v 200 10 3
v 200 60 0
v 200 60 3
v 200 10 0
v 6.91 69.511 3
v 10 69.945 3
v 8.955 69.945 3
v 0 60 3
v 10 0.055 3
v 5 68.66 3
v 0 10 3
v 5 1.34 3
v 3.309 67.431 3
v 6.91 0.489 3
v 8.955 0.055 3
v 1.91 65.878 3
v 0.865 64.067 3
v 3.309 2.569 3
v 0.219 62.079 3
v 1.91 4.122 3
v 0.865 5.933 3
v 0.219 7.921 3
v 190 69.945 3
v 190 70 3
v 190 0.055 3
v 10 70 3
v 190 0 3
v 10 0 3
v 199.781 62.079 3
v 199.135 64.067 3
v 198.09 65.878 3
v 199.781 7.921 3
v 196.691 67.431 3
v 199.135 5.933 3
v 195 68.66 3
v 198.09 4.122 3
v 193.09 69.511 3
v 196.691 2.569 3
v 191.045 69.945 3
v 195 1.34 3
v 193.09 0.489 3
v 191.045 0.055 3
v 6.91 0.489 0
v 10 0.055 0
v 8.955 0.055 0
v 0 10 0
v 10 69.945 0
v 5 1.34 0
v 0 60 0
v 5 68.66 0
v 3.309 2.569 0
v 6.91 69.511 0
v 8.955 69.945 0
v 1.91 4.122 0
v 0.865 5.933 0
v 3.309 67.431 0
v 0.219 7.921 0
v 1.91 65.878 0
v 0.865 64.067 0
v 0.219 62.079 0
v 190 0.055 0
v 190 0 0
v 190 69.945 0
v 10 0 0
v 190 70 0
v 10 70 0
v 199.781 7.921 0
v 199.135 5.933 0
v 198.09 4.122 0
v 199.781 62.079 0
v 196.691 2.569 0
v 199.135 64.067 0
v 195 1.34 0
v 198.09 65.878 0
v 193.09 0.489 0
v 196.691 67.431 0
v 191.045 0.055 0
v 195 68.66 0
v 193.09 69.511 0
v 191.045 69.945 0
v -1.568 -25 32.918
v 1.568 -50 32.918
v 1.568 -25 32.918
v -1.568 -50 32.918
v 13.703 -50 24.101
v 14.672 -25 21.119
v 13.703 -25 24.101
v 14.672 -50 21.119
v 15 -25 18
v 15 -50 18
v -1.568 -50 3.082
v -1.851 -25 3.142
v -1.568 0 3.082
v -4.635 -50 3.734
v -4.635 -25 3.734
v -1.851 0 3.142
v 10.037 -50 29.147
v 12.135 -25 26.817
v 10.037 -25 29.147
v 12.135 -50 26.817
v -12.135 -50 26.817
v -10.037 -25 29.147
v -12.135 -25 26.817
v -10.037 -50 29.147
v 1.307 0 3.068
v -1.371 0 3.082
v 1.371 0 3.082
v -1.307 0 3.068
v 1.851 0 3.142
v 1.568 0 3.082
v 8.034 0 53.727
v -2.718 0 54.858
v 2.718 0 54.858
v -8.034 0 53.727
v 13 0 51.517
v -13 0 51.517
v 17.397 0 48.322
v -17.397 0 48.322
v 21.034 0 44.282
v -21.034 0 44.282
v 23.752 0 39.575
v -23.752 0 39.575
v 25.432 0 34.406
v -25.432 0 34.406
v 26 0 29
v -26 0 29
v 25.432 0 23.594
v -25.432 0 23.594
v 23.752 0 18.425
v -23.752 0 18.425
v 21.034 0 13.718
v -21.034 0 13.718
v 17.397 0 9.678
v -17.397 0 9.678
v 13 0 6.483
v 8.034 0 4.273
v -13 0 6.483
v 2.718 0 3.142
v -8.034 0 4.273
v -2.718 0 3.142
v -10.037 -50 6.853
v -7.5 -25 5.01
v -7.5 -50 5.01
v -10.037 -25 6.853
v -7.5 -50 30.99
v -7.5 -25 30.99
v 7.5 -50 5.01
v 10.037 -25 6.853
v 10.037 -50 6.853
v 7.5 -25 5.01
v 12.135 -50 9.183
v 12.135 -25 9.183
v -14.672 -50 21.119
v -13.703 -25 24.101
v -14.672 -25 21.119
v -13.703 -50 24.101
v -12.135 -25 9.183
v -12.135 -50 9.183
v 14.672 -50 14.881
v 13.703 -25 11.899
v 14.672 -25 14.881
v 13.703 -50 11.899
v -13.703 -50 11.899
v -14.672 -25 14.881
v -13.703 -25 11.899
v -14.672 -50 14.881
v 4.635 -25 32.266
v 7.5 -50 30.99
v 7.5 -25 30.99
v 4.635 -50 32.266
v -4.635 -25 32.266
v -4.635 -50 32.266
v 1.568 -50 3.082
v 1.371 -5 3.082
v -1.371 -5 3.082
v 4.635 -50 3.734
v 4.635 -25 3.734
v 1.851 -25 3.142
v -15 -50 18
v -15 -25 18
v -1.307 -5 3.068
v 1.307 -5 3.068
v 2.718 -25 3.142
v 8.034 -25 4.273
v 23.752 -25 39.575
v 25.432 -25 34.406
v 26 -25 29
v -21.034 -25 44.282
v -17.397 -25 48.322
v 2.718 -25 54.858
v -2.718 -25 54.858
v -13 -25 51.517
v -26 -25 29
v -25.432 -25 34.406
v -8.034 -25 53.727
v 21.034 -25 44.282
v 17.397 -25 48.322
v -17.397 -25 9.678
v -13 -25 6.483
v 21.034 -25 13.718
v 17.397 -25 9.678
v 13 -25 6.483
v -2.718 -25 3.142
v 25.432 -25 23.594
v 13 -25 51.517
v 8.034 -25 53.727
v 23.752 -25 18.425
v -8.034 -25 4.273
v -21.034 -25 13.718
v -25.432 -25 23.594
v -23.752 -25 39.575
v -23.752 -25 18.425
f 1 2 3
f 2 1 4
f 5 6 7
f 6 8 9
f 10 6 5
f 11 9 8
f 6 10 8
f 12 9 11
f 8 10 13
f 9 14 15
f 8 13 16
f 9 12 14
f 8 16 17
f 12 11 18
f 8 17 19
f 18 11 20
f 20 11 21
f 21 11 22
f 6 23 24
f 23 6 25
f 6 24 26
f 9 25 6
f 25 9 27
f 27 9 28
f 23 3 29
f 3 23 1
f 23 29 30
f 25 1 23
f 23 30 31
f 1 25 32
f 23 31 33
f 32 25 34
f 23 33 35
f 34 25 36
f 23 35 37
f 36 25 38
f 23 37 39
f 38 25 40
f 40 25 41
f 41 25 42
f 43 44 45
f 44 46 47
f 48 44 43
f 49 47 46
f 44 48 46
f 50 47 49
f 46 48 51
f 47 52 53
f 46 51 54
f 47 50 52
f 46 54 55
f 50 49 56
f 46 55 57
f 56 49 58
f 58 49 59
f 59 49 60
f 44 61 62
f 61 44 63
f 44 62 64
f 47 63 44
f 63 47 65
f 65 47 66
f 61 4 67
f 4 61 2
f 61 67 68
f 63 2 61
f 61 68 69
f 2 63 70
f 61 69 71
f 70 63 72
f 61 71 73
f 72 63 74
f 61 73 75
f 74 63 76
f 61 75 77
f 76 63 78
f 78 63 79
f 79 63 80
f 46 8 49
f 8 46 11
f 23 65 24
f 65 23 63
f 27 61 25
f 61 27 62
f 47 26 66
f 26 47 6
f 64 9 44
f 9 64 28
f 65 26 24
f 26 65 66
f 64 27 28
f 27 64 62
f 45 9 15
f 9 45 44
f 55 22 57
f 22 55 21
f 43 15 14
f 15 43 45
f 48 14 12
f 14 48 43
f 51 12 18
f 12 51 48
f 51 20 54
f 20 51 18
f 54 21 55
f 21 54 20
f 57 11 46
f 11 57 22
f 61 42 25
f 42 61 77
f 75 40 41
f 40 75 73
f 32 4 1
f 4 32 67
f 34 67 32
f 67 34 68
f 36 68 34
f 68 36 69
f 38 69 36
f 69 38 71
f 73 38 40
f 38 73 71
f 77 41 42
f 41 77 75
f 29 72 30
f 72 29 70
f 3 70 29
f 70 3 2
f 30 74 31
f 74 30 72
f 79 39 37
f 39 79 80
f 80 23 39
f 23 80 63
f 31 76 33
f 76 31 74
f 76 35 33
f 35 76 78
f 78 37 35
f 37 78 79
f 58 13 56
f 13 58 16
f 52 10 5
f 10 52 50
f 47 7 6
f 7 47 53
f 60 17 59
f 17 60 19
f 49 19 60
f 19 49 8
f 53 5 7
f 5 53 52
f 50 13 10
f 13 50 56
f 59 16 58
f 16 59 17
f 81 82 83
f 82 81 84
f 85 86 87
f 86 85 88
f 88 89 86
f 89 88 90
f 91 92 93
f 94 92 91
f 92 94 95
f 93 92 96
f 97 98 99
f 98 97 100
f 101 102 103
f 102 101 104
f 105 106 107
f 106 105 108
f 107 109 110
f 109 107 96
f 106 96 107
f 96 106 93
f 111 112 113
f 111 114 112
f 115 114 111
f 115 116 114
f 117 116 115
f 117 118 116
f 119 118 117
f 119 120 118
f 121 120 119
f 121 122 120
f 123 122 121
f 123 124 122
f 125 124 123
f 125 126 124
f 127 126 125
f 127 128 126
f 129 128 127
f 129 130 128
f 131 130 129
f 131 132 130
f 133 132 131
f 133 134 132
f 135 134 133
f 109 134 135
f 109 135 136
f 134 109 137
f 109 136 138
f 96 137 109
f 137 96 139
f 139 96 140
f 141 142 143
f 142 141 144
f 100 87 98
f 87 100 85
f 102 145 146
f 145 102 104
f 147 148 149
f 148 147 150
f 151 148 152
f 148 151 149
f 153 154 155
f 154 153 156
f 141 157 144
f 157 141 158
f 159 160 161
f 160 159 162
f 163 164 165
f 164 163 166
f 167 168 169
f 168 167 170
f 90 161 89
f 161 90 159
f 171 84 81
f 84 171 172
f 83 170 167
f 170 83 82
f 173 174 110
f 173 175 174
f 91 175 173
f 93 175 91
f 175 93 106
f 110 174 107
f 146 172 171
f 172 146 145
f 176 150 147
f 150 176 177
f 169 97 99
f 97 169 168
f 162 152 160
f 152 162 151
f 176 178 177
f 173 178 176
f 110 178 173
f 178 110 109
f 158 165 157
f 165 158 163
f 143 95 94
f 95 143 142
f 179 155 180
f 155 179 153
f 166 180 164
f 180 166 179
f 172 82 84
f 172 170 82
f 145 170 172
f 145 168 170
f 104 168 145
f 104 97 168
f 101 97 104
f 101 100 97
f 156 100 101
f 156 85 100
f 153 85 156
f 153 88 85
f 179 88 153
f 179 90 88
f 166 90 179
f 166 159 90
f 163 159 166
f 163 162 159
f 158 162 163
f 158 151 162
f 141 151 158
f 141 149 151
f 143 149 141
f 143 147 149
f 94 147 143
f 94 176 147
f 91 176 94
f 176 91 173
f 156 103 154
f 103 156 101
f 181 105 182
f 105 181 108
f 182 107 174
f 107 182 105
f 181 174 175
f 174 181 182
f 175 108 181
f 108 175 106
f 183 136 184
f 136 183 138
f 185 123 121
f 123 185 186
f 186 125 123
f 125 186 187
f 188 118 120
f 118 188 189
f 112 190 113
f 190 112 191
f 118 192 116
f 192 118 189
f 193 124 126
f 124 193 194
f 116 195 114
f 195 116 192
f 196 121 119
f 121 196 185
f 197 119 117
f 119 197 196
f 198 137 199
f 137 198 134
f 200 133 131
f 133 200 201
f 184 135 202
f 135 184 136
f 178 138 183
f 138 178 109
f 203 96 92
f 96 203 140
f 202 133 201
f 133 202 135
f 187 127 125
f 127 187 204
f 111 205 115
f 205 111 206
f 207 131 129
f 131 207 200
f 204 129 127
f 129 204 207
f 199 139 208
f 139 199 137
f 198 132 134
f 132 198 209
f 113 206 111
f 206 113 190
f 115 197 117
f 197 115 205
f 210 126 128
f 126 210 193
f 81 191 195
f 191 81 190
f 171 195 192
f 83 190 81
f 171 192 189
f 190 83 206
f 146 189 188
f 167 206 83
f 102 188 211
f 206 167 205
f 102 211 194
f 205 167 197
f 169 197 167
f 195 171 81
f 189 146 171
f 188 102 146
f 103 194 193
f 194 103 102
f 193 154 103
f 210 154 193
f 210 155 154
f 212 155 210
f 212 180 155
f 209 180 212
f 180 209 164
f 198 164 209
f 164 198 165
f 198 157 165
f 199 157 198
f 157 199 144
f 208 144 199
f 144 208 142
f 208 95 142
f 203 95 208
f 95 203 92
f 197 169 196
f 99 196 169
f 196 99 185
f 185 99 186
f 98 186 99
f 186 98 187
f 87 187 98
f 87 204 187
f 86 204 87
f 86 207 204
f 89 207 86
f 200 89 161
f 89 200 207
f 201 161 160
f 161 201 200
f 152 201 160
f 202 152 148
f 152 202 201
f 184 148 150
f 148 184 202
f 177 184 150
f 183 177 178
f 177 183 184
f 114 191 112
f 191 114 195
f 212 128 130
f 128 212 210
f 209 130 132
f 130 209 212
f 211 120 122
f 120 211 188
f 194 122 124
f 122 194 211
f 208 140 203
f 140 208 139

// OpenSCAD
// coffee carrier insert

//TODO measure the thing

//physical things
//carrier itself
base_width = 200;
base_height = 70;
base_thickness = 3;
base_corner_radius = 10;

//coffee bits
body_height = 50;
body_diam = 30;

filter_disc_diam = 25;
filter_dics_thickness = 5;

ring_diam = 52;
ring_height = 25;



//make wider part of base
translate([0,base_corner_radius,0]){
    cube([base_width,base_height-base_corner_radius*2,base_thickness]);
}

//make taller part of base
translate([base_corner_radius,0,0]){
    cube([base_width-base_corner_radius*2,base_height,base_thickness]);
}

//make rounded corners
translate([base_corner_radius,base_corner_radius,0]){
    cylinder(base_thickness,base_corner_radius,base_corner_radius);
}
translate([base_width-base_corner_radius,base_corner_radius,0]){
    cylinder(base_thickness,base_corner_radius,base_corner_radius);
}
translate([base_width-base_corner_radius,base_height-base_corner_radius,0]){
    cylinder(base_thickness,base_corner_radius,base_corner_radius);
}
translate([base_corner_radius,base_height-base_corner_radius,0]){
    cylinder(base_thickness,base_corner_radius,base_corner_radius);
}



// objects to use as voids
translate([0,0,body_diam/2+base_thickness]){
    rotate([90,0,0]){
        cylinder(body_height,body_diam/2,body_diam/2);
    }
}
translate([0,0,filter_disc_diam/2+base_thickness]){
    rotate([90,0,0]){
        cylinder(filter_dics_thickness,filter_disc_diam/2,filter_disc_diam/2);
    }
}
translate([0,0,ring_diam/2+base_thickness]){
    rotate([90,0,0]){
        cylinder(ring_height,ring_diam/2,ring_diam/2);
    }
}
    
    
    
    
    
    
    
